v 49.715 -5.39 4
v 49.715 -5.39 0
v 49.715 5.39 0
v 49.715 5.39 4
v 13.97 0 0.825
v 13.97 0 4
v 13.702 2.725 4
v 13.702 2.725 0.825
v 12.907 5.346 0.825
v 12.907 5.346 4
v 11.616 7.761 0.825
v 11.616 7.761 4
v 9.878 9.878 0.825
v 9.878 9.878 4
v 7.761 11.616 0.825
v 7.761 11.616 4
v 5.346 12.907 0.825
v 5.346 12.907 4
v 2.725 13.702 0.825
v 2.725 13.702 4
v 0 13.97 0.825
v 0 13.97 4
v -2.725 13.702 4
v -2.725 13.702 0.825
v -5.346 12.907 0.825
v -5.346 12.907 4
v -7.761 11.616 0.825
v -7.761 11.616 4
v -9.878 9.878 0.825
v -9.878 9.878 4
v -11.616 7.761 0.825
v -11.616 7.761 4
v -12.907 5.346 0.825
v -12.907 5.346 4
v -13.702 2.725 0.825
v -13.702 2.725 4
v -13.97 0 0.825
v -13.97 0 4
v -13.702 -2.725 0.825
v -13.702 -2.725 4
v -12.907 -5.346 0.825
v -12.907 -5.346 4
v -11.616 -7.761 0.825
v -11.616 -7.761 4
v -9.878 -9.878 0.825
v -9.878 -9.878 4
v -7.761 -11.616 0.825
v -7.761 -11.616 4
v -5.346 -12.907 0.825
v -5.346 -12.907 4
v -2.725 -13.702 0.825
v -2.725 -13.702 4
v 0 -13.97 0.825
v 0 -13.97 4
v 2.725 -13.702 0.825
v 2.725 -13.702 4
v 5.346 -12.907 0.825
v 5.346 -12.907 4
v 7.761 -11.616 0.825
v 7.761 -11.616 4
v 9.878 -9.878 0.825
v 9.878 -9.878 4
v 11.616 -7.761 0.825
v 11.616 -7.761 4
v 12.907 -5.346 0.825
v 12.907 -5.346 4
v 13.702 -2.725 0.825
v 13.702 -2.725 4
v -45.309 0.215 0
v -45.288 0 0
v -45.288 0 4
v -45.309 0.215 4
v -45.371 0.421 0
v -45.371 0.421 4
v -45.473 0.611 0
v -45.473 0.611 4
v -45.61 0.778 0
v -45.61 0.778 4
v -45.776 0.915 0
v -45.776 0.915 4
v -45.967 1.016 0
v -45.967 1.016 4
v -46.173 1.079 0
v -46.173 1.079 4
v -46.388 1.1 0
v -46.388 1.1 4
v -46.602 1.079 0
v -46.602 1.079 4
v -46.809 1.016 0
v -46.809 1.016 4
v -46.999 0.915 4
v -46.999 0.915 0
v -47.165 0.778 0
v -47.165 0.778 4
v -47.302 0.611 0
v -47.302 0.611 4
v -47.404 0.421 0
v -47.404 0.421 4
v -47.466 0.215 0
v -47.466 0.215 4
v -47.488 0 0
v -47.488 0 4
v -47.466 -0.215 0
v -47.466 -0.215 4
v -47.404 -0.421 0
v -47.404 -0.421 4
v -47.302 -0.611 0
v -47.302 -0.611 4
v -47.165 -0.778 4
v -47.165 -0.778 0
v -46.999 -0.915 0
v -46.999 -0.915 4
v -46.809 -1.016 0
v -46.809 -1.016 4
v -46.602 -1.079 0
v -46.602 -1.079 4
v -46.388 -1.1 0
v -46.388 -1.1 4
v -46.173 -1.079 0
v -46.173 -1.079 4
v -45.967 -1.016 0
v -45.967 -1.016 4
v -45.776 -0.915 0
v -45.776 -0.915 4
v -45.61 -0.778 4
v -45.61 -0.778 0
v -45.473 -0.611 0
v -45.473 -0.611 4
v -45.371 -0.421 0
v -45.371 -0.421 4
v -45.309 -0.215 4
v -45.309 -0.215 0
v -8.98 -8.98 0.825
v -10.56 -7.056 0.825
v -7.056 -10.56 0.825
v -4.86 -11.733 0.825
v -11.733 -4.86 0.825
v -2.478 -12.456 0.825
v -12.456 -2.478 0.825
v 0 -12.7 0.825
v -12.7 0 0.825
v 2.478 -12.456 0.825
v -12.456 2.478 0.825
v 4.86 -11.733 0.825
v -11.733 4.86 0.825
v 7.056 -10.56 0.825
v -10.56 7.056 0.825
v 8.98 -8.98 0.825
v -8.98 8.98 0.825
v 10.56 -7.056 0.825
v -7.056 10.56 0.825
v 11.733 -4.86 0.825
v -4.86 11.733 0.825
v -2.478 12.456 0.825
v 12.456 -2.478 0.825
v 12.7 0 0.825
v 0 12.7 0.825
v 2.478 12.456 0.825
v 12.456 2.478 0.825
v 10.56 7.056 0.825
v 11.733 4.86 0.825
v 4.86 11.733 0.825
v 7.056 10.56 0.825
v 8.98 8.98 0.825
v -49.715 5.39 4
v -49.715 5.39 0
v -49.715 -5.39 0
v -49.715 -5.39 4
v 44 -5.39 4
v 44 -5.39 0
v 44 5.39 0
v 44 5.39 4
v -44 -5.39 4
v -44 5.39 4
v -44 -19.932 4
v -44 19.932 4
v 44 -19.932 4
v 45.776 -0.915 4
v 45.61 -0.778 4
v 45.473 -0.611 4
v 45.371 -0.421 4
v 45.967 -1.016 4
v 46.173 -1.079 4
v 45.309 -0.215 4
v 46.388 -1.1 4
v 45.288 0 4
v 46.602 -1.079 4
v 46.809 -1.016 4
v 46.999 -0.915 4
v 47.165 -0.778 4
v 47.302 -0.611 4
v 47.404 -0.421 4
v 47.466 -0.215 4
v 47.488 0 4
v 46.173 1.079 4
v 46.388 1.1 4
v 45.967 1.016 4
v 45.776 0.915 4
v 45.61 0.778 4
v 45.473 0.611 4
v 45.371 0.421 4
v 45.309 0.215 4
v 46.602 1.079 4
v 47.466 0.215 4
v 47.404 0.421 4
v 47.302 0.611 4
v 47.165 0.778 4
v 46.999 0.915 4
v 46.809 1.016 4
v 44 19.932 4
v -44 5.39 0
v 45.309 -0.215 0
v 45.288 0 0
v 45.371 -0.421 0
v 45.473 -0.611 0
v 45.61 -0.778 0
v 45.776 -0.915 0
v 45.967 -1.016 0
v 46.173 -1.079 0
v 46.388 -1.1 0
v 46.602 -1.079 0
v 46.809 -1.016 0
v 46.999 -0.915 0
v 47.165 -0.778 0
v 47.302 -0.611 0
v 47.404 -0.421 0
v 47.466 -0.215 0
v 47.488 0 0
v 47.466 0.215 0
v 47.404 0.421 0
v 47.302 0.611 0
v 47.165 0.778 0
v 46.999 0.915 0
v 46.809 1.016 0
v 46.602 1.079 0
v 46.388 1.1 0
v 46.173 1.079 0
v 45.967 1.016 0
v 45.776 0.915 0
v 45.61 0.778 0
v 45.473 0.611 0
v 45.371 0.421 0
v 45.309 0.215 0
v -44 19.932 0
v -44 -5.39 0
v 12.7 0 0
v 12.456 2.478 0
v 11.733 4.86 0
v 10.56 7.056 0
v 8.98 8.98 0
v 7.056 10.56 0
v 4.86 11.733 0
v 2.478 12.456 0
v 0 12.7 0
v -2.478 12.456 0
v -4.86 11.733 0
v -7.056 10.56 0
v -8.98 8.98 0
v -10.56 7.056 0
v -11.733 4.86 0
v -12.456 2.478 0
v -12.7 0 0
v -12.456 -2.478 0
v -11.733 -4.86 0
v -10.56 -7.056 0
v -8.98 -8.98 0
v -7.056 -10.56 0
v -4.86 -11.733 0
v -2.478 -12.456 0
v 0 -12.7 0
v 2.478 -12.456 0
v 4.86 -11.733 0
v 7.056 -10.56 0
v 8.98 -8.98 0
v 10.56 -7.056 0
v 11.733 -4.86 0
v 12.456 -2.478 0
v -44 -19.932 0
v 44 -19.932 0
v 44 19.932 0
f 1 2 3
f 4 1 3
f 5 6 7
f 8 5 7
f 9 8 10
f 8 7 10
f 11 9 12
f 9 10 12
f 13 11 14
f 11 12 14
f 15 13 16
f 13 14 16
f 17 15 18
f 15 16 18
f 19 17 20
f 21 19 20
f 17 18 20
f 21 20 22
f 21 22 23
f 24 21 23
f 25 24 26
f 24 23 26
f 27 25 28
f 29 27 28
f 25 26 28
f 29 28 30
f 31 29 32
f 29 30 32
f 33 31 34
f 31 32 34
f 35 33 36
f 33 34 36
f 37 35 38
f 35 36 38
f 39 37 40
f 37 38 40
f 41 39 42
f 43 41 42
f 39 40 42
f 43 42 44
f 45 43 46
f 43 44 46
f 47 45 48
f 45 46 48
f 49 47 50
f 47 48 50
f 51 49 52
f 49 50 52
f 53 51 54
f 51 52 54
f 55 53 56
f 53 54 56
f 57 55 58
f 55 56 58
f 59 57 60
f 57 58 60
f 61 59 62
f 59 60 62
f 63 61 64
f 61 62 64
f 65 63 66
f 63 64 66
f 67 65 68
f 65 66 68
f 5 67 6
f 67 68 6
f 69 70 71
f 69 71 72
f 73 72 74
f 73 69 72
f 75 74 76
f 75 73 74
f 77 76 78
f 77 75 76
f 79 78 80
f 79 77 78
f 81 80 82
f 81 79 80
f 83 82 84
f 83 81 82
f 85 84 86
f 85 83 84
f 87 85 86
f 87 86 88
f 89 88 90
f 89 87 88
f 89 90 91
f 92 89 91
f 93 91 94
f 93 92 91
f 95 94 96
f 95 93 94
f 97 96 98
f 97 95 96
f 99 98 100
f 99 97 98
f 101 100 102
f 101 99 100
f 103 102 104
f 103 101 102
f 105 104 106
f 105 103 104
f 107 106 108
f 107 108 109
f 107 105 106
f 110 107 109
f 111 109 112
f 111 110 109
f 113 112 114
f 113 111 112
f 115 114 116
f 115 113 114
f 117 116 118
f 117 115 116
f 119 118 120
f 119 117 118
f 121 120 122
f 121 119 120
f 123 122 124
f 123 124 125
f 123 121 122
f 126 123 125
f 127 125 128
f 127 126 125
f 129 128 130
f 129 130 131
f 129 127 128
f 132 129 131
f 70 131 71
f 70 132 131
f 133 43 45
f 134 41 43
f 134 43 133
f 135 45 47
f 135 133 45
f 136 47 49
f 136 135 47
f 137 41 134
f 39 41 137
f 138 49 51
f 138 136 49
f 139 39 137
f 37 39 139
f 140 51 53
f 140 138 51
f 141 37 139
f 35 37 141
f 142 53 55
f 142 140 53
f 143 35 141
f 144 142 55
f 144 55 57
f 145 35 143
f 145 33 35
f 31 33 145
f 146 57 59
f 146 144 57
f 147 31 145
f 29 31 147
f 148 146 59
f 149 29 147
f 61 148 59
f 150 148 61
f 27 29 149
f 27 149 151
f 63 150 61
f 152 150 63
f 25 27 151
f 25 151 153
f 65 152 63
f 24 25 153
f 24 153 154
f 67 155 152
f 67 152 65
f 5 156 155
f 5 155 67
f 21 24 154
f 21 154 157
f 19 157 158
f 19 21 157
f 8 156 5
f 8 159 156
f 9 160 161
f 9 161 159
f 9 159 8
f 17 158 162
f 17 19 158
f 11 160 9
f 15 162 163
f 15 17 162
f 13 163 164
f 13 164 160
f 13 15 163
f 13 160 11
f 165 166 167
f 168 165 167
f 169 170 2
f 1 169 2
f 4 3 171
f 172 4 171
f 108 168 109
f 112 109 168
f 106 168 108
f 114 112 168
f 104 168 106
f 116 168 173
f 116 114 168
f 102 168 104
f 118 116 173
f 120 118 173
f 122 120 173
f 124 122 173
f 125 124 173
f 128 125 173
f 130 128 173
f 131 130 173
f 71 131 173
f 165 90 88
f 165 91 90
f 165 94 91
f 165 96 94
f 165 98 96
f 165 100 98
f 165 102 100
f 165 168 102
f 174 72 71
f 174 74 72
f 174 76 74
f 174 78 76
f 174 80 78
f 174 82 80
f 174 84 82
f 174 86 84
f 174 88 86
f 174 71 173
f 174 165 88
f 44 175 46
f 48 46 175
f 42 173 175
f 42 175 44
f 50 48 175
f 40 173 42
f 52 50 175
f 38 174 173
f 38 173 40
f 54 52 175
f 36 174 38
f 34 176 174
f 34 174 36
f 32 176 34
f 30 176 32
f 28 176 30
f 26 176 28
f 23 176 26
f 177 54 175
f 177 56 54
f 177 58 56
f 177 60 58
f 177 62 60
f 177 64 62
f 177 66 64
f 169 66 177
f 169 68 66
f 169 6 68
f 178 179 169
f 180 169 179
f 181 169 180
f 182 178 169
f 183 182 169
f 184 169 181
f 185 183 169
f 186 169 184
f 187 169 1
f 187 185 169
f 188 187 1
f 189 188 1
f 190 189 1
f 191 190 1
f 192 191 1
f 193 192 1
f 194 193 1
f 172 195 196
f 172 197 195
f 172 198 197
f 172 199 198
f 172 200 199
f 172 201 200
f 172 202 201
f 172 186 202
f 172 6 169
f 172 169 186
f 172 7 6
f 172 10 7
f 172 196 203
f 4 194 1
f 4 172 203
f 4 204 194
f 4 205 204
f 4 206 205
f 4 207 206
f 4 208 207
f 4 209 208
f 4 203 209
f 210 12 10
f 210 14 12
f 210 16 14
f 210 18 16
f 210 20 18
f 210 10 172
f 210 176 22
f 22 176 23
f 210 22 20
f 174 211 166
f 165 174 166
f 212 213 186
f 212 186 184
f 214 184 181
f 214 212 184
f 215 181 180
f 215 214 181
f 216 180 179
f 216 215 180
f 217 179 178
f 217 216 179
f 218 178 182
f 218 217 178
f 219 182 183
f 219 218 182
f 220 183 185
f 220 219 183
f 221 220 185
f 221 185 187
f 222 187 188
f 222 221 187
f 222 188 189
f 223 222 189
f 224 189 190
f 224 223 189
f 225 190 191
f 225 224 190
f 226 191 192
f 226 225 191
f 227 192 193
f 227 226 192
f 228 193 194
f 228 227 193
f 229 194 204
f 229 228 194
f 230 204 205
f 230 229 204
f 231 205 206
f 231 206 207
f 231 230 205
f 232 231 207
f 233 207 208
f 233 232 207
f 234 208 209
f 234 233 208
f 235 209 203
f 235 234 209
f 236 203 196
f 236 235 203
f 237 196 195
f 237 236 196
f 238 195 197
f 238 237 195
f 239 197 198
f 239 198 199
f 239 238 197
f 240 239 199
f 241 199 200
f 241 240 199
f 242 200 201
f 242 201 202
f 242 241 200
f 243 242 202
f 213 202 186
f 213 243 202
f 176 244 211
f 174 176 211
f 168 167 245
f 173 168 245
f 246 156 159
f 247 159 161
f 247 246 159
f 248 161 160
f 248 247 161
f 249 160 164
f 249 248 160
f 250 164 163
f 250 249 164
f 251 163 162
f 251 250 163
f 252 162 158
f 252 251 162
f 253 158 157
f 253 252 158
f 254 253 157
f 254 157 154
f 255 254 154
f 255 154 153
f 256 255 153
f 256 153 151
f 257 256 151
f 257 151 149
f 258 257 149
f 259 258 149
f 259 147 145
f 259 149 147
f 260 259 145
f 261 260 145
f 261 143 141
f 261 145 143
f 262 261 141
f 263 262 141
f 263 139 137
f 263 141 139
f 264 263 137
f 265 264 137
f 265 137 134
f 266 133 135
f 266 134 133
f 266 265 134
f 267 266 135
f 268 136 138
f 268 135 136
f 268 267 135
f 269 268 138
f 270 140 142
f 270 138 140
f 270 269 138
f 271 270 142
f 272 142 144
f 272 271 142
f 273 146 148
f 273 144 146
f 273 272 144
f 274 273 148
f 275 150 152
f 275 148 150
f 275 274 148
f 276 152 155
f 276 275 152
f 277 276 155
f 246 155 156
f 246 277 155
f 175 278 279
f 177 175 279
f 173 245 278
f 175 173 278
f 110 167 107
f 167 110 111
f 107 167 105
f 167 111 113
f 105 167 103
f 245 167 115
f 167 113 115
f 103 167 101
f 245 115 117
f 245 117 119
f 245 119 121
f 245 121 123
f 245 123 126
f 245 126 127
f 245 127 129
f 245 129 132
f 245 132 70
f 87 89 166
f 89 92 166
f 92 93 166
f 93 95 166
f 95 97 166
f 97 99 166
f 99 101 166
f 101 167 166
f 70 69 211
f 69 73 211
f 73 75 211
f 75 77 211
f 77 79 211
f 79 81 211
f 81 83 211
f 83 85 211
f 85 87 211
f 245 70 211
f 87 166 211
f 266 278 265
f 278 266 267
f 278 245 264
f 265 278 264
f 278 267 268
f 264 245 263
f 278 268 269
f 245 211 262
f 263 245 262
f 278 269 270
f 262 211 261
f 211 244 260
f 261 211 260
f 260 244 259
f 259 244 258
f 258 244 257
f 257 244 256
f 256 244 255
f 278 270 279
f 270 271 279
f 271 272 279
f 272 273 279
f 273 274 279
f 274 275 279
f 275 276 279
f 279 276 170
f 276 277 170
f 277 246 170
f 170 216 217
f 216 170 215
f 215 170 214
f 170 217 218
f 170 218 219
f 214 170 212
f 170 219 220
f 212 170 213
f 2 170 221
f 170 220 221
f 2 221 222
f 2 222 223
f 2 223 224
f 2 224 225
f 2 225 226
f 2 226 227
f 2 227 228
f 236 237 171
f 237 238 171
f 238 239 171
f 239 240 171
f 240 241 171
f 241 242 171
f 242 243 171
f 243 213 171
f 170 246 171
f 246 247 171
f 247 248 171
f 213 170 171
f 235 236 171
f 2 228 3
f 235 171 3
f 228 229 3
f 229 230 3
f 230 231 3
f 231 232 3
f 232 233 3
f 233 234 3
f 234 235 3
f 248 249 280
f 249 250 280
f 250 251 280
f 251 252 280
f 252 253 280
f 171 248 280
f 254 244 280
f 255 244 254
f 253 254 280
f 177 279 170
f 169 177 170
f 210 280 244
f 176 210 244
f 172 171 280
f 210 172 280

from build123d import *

# Parameters (mm, degrees)
SKETCH1_R           = 12.7
SKETCH1_R_2         = 1.1
BOSS_EXTRUDE1_DEPTH = 4
SKETCH2_R           = 13.97
CUT_EXTRUDE1_DEPTH  = 3.175


with BuildPart() as part:
    # Sketch1 → Boss-Extrude1 (new body)
    with BuildSketch(Plane.XY):
        Polygon((-44, 19.9319), (-44, 5.39), (-49.715, 5.39), (-49.715, -5.39), (-44, -5.39), (-44, -19.9319), (44, -19.9319), (44, -5.39), (49.715, -5.39), (49.715, 5.39), (44, 5.39), (44, 19.9319), align=None)
        Circle(SKETCH1_R, mode=Mode.SUBTRACT)
        with Locations((-46.3876, 0)):
            Circle(SKETCH1_R_2, mode=Mode.SUBTRACT)
        with Locations(Location((46.3876, 0, 0), (0, 0, 180))):
            Circle(SKETCH1_R_2, mode=Mode.SUBTRACT)
    extrude(amount=BOSS_EXTRUDE1_DEPTH)

    # Sketch2 → Cut-Extrude1 (cut)
    with BuildSketch(Plane.XY.offset(4)):
        Circle(SKETCH2_R)
    extrude(amount=-CUT_EXTRUDE1_DEPTH, mode=Mode.SUBTRACT)


solid = part.part
